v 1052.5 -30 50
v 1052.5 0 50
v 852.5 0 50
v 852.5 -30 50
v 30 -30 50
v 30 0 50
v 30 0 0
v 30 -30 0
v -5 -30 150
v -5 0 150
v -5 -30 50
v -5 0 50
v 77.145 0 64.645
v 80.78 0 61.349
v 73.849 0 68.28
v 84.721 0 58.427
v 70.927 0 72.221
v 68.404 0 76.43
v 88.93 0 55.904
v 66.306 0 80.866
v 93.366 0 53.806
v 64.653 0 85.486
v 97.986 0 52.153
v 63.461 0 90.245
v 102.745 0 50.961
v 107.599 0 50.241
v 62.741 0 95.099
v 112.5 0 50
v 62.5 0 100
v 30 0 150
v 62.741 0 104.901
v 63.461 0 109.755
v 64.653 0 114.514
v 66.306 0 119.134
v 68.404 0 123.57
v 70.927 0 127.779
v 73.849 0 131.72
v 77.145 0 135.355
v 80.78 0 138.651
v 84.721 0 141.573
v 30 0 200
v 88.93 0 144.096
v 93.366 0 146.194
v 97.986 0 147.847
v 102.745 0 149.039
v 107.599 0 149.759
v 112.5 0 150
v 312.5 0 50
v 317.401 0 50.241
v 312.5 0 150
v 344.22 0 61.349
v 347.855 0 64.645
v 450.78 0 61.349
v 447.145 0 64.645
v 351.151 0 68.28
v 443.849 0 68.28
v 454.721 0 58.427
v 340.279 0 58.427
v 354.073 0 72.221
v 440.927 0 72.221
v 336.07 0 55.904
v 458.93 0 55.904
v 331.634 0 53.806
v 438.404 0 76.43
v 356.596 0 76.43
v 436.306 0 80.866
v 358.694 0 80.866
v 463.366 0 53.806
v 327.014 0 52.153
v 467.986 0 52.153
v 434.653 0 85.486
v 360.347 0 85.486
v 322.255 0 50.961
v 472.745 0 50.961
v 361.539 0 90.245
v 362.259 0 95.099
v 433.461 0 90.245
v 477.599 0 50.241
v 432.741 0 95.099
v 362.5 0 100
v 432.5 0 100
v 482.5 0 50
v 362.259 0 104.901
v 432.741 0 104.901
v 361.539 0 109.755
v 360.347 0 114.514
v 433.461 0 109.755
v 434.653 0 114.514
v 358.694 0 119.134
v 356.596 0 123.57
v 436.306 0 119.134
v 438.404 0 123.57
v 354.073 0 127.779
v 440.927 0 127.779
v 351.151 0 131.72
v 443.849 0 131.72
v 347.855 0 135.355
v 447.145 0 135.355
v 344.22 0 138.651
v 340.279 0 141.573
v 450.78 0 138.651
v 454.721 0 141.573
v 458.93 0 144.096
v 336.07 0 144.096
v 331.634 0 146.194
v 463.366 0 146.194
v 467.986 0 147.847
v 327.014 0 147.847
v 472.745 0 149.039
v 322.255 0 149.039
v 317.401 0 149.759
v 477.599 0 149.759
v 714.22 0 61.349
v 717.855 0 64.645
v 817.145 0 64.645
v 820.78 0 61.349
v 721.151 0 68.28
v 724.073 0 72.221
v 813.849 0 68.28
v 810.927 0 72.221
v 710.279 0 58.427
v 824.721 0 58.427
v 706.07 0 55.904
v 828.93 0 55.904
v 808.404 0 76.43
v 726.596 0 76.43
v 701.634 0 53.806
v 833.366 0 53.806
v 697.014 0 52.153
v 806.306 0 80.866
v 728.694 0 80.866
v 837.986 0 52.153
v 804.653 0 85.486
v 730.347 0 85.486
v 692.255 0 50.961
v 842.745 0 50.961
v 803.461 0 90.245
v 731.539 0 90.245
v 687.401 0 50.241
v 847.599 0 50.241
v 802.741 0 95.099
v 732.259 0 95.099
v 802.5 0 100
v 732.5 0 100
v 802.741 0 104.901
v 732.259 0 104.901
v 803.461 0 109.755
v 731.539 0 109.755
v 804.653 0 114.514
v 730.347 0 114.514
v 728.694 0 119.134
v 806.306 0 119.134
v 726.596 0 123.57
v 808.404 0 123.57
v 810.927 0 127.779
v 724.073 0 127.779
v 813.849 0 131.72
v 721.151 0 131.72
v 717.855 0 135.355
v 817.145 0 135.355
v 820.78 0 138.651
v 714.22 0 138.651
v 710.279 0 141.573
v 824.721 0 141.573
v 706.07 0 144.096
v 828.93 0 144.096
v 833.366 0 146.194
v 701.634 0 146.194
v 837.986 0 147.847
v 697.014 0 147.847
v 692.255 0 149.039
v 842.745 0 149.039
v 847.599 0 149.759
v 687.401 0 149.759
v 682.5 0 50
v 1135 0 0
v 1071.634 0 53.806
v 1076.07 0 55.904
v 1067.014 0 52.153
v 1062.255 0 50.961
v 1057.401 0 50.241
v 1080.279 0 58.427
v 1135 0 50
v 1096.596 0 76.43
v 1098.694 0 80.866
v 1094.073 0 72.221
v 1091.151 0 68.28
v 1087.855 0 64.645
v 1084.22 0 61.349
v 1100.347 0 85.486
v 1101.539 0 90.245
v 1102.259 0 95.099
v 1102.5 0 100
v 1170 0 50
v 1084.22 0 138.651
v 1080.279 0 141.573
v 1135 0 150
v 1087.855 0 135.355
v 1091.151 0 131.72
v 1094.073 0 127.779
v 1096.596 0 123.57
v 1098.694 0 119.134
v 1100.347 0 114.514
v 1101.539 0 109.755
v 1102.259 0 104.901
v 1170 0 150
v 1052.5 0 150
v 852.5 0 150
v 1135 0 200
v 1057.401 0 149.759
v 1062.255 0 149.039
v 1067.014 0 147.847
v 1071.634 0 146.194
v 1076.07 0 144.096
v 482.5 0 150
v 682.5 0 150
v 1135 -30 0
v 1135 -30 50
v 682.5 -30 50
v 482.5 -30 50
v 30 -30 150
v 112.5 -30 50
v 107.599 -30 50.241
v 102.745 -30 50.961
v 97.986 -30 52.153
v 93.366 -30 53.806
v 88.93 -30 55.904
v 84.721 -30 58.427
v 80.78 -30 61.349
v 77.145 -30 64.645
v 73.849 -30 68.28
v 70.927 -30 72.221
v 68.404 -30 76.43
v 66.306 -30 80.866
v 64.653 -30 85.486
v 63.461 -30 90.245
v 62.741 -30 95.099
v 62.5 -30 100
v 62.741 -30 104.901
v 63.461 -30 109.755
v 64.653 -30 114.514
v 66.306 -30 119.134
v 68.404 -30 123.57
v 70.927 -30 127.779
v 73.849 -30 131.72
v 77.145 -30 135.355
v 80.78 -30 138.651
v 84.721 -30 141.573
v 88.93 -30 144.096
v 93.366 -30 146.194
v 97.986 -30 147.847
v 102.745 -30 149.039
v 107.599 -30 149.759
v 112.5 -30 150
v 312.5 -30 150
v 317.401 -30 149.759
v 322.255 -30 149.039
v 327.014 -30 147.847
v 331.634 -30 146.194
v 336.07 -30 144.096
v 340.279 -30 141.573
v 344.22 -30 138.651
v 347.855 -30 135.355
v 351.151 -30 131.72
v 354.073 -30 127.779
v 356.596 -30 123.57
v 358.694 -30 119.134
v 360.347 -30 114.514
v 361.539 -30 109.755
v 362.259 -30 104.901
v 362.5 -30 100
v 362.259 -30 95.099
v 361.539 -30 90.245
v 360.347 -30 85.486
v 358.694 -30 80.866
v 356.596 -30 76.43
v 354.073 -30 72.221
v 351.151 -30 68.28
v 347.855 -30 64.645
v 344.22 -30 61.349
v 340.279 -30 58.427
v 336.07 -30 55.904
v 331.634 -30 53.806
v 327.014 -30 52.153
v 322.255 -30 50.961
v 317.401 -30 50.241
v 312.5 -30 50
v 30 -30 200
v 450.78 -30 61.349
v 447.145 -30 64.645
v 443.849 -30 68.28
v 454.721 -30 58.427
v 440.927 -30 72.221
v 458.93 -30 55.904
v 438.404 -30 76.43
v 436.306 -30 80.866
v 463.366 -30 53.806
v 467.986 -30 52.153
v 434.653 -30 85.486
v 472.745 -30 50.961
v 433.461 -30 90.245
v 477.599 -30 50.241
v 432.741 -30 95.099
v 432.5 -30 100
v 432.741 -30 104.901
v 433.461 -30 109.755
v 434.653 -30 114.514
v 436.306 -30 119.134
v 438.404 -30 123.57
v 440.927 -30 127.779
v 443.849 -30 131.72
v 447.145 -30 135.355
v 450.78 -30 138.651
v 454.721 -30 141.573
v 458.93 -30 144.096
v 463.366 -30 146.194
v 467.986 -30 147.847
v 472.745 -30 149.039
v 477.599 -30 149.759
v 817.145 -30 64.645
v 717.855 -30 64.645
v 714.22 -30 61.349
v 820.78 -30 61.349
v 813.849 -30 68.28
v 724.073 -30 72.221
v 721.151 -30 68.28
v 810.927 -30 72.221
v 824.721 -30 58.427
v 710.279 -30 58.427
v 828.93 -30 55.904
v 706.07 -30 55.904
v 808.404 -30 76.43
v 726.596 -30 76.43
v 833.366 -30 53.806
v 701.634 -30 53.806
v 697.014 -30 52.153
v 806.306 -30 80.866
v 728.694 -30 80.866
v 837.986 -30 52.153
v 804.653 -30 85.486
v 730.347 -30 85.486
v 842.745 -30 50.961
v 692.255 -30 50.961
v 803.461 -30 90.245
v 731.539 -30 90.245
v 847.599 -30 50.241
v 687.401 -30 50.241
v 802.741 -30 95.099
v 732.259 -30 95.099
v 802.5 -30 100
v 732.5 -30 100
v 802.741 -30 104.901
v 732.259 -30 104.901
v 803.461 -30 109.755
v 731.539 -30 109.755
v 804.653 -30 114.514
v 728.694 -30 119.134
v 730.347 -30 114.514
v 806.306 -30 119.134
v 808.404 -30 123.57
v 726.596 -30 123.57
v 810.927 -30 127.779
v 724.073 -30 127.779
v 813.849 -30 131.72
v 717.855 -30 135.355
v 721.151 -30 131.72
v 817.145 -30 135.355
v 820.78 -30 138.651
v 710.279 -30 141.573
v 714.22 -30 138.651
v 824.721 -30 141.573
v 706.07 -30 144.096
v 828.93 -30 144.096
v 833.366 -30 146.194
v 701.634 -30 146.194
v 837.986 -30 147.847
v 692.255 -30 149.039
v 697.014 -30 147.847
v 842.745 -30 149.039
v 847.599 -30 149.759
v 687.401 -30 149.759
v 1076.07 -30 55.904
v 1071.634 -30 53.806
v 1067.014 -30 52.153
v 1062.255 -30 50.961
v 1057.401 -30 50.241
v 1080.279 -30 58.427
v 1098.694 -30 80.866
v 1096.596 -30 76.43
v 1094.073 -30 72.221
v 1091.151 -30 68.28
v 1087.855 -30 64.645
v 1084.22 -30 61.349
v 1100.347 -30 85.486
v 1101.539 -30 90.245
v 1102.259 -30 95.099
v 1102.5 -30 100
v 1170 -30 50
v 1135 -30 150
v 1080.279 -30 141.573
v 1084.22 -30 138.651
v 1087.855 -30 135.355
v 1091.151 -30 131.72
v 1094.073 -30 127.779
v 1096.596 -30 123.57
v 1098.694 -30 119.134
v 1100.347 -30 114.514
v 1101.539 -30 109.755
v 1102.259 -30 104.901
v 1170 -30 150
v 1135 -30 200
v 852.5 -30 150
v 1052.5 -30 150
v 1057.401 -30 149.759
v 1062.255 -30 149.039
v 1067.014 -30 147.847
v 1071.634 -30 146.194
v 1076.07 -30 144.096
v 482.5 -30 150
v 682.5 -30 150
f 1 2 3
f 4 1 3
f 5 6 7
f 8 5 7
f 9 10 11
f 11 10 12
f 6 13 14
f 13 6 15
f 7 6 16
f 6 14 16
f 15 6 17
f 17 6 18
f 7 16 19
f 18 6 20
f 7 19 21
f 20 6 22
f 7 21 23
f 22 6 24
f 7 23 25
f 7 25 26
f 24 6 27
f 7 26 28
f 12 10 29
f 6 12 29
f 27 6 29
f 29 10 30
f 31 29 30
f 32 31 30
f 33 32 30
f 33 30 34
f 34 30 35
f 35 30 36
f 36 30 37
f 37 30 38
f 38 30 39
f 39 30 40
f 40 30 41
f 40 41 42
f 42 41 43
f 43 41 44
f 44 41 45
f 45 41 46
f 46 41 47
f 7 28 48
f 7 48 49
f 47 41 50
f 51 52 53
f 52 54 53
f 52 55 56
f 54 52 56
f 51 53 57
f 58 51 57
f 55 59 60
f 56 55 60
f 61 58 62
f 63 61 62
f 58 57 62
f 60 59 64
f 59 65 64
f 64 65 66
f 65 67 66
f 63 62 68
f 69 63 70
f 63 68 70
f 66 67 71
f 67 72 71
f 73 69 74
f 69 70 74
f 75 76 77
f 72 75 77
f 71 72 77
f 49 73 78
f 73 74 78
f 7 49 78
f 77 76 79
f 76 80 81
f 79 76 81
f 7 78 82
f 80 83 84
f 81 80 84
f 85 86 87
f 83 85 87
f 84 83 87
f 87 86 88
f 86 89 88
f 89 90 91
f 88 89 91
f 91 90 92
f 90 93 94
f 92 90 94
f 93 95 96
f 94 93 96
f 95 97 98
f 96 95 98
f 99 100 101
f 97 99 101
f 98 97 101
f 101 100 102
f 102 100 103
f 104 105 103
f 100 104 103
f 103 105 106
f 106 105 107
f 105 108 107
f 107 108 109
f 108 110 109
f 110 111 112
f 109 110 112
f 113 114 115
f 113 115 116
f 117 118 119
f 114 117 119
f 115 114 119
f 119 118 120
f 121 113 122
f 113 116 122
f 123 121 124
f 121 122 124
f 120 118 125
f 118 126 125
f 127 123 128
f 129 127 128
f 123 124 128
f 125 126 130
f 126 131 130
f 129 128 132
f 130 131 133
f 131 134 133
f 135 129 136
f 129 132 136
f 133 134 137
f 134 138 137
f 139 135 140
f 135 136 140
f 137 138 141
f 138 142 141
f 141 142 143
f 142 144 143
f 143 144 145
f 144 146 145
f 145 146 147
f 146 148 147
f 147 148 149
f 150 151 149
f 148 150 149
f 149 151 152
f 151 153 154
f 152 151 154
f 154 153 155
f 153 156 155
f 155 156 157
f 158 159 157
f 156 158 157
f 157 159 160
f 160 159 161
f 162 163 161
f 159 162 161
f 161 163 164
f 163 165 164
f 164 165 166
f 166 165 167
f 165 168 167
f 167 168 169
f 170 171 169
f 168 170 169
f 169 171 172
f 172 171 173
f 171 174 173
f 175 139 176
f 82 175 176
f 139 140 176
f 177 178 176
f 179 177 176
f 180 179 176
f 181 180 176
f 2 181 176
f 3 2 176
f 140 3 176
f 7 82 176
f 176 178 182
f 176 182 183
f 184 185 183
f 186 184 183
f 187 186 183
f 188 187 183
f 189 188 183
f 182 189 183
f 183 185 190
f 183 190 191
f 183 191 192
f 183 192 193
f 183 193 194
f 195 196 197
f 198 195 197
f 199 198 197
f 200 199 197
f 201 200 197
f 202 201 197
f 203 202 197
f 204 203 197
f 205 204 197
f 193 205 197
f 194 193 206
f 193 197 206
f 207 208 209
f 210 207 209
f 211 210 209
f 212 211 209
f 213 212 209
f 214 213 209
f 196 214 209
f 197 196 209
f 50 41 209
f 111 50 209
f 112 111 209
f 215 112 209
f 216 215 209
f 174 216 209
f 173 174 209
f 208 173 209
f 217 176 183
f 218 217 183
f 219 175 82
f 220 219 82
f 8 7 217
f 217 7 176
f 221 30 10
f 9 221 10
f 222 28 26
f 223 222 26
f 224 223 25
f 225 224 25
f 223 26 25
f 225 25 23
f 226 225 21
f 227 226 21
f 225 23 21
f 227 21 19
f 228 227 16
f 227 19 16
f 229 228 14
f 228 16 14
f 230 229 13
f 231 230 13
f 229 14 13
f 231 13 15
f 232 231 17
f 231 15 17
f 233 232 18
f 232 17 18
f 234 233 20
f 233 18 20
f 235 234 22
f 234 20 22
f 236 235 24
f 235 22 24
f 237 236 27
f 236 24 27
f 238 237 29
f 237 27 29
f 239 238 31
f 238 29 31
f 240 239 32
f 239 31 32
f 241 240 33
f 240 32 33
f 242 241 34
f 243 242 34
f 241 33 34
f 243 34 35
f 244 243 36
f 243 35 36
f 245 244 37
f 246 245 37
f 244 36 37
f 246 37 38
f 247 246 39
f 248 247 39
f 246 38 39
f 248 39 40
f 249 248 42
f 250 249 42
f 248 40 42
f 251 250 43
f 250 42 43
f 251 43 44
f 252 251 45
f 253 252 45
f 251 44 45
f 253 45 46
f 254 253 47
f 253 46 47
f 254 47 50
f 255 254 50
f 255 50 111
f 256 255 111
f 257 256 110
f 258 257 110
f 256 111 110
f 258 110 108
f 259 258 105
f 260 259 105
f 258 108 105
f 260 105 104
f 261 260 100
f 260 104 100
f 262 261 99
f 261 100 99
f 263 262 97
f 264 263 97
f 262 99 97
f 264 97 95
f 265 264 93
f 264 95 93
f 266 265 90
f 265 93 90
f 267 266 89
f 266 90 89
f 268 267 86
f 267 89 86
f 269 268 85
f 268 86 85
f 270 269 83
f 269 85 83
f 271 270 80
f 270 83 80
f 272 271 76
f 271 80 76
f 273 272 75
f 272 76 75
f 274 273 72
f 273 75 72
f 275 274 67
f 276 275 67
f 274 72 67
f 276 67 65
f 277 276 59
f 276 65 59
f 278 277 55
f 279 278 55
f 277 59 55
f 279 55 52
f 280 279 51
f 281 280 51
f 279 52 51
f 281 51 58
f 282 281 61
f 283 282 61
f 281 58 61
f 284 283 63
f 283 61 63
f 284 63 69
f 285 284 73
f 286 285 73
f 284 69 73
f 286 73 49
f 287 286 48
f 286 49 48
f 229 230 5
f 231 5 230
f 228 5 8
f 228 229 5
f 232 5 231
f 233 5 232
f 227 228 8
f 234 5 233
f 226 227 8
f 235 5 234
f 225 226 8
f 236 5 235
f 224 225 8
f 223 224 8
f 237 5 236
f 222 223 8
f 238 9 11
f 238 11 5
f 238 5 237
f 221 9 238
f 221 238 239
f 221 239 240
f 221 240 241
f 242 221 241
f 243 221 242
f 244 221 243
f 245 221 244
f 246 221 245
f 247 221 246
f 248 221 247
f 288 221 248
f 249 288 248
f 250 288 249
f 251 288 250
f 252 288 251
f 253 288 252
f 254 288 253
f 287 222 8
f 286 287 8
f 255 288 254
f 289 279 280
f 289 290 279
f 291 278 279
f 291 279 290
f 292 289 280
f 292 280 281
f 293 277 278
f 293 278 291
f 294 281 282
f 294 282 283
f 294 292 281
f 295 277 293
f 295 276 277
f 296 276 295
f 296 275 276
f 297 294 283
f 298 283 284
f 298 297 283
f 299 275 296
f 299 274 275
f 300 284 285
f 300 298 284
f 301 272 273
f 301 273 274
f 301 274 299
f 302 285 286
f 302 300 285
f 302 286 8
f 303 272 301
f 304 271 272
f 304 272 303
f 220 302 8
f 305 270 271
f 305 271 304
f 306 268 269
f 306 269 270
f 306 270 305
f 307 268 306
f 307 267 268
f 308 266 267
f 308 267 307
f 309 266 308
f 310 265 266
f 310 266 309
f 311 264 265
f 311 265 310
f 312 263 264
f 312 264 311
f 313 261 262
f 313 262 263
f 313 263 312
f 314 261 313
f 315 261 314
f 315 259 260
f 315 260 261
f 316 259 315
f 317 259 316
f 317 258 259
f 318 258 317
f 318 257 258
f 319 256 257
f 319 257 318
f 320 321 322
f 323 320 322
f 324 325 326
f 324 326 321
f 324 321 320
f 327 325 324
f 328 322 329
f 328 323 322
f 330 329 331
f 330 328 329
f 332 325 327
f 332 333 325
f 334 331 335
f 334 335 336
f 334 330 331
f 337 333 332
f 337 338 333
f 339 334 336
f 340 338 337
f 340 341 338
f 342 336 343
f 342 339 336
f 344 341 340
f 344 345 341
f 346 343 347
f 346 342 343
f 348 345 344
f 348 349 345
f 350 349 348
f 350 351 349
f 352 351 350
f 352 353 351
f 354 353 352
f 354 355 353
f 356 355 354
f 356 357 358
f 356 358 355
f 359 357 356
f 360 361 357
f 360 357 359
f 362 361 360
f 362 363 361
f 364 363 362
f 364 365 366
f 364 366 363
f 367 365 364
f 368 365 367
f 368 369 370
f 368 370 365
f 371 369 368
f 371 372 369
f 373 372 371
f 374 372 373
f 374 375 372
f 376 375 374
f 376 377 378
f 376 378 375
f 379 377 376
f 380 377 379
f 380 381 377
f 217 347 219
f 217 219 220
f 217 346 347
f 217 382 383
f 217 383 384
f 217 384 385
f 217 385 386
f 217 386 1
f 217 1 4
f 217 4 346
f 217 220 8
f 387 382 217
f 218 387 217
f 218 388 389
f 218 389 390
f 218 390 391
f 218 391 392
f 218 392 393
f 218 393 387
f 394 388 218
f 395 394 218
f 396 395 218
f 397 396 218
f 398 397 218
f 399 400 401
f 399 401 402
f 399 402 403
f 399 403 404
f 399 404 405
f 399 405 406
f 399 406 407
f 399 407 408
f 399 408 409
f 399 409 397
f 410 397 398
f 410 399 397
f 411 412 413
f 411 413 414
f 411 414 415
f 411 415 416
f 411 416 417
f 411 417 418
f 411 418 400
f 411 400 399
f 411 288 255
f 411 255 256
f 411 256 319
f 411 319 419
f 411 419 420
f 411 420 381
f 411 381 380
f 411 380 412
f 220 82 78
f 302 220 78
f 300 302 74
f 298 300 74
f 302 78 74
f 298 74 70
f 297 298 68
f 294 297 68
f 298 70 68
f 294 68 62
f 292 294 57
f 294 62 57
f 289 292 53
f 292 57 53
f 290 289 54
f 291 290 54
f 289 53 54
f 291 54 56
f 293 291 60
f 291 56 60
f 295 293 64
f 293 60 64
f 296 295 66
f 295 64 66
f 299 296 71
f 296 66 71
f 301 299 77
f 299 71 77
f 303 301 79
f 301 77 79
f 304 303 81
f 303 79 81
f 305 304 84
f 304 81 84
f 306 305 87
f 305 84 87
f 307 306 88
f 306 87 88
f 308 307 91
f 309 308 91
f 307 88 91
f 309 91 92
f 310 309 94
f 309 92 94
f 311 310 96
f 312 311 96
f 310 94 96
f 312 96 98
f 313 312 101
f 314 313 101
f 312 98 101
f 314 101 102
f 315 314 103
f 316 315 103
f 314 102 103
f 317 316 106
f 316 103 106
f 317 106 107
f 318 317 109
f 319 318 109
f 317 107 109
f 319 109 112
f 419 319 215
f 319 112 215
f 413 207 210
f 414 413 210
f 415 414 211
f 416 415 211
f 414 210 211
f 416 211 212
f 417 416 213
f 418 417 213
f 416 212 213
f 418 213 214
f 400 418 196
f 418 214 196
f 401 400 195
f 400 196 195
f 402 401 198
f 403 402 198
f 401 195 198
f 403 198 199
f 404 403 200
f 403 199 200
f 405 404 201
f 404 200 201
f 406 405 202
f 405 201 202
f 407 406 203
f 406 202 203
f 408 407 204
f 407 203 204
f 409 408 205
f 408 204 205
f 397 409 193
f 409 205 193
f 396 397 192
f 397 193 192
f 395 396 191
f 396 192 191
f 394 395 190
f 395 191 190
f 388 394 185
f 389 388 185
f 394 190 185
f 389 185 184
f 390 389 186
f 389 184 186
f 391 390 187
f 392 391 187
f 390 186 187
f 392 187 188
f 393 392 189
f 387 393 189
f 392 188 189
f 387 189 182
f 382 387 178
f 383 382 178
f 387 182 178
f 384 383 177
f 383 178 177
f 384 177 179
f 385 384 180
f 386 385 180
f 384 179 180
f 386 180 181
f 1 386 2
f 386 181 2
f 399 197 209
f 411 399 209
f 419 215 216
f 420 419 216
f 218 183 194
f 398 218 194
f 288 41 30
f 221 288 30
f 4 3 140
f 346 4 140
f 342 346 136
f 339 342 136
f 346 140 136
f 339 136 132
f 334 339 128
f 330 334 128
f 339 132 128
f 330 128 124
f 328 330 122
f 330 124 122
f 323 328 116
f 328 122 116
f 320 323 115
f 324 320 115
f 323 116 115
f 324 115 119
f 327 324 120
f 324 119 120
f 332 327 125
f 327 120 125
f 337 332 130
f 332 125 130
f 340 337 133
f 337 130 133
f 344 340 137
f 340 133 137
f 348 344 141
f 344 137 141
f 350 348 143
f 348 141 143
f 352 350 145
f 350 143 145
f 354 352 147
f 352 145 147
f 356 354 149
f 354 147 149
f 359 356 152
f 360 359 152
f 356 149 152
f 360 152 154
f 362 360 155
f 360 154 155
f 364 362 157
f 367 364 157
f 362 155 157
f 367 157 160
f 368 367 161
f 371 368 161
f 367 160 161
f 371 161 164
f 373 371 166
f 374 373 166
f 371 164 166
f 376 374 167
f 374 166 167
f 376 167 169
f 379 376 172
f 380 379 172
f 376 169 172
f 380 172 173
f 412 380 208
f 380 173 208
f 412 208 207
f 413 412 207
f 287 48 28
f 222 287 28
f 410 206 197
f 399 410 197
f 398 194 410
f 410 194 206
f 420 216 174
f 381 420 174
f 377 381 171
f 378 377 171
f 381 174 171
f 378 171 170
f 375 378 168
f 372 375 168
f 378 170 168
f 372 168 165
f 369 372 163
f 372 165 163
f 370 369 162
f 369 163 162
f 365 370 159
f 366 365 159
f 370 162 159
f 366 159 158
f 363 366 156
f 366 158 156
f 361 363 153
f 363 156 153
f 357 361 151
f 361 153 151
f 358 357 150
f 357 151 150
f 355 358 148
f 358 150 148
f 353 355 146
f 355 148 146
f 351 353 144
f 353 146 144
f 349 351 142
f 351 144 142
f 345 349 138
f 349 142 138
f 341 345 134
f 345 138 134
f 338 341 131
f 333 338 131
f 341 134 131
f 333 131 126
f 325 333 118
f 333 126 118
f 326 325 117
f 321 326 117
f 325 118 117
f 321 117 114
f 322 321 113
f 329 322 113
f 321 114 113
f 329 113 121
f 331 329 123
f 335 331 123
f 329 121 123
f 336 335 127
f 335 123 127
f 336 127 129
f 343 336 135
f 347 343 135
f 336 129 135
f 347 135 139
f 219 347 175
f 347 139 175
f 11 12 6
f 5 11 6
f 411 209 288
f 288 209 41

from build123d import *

# Parameters (mm, degrees)
F1_DEPTH = 30


with BuildPart() as f1:
    # F0 (on Front) → F1 (new body)
    with BuildSketch(Plane.XZ):
        Polygon((30, 50), (30, 0), (1135, 0), (1135, 50), (1170, 50), (1170, 150), (1135, 150), (1135, 200), (30, 200), (30, 150), (-5, 150), (-5, 50), align=None)
        with BuildLine():
            Line((312.5, 50), (112.5, 50))
            ThreePointArc((112.5, 50), (62.5, 100), (112.5, 150))
            Line((112.5, 150), (312.5, 150))
            ThreePointArc((312.5, 150), (362.5, 100), (312.5, 50))
        make_face(mode=Mode.SUBTRACT)
        with BuildLine():
            Line((682.5, 50), (482.5, 50))
            ThreePointArc((482.5, 50), (432.5, 100), (482.5, 150))
            Line((482.5, 150), (682.5, 150))
            ThreePointArc((682.5, 150), (732.5, 100), (682.5, 50))
        make_face(mode=Mode.SUBTRACT)
        with BuildLine():
            Line((1052.5, 50), (852.5, 50))
            ThreePointArc((852.5, 50), (802.5, 100), (852.5, 150))
            Line((852.5, 150), (1052.5, 150))
            ThreePointArc((1052.5, 150), (1102.5, 100), (1052.5, 50))
        make_face(mode=Mode.SUBTRACT)
    extrude(amount=F1_DEPTH)


solid = f1.part
